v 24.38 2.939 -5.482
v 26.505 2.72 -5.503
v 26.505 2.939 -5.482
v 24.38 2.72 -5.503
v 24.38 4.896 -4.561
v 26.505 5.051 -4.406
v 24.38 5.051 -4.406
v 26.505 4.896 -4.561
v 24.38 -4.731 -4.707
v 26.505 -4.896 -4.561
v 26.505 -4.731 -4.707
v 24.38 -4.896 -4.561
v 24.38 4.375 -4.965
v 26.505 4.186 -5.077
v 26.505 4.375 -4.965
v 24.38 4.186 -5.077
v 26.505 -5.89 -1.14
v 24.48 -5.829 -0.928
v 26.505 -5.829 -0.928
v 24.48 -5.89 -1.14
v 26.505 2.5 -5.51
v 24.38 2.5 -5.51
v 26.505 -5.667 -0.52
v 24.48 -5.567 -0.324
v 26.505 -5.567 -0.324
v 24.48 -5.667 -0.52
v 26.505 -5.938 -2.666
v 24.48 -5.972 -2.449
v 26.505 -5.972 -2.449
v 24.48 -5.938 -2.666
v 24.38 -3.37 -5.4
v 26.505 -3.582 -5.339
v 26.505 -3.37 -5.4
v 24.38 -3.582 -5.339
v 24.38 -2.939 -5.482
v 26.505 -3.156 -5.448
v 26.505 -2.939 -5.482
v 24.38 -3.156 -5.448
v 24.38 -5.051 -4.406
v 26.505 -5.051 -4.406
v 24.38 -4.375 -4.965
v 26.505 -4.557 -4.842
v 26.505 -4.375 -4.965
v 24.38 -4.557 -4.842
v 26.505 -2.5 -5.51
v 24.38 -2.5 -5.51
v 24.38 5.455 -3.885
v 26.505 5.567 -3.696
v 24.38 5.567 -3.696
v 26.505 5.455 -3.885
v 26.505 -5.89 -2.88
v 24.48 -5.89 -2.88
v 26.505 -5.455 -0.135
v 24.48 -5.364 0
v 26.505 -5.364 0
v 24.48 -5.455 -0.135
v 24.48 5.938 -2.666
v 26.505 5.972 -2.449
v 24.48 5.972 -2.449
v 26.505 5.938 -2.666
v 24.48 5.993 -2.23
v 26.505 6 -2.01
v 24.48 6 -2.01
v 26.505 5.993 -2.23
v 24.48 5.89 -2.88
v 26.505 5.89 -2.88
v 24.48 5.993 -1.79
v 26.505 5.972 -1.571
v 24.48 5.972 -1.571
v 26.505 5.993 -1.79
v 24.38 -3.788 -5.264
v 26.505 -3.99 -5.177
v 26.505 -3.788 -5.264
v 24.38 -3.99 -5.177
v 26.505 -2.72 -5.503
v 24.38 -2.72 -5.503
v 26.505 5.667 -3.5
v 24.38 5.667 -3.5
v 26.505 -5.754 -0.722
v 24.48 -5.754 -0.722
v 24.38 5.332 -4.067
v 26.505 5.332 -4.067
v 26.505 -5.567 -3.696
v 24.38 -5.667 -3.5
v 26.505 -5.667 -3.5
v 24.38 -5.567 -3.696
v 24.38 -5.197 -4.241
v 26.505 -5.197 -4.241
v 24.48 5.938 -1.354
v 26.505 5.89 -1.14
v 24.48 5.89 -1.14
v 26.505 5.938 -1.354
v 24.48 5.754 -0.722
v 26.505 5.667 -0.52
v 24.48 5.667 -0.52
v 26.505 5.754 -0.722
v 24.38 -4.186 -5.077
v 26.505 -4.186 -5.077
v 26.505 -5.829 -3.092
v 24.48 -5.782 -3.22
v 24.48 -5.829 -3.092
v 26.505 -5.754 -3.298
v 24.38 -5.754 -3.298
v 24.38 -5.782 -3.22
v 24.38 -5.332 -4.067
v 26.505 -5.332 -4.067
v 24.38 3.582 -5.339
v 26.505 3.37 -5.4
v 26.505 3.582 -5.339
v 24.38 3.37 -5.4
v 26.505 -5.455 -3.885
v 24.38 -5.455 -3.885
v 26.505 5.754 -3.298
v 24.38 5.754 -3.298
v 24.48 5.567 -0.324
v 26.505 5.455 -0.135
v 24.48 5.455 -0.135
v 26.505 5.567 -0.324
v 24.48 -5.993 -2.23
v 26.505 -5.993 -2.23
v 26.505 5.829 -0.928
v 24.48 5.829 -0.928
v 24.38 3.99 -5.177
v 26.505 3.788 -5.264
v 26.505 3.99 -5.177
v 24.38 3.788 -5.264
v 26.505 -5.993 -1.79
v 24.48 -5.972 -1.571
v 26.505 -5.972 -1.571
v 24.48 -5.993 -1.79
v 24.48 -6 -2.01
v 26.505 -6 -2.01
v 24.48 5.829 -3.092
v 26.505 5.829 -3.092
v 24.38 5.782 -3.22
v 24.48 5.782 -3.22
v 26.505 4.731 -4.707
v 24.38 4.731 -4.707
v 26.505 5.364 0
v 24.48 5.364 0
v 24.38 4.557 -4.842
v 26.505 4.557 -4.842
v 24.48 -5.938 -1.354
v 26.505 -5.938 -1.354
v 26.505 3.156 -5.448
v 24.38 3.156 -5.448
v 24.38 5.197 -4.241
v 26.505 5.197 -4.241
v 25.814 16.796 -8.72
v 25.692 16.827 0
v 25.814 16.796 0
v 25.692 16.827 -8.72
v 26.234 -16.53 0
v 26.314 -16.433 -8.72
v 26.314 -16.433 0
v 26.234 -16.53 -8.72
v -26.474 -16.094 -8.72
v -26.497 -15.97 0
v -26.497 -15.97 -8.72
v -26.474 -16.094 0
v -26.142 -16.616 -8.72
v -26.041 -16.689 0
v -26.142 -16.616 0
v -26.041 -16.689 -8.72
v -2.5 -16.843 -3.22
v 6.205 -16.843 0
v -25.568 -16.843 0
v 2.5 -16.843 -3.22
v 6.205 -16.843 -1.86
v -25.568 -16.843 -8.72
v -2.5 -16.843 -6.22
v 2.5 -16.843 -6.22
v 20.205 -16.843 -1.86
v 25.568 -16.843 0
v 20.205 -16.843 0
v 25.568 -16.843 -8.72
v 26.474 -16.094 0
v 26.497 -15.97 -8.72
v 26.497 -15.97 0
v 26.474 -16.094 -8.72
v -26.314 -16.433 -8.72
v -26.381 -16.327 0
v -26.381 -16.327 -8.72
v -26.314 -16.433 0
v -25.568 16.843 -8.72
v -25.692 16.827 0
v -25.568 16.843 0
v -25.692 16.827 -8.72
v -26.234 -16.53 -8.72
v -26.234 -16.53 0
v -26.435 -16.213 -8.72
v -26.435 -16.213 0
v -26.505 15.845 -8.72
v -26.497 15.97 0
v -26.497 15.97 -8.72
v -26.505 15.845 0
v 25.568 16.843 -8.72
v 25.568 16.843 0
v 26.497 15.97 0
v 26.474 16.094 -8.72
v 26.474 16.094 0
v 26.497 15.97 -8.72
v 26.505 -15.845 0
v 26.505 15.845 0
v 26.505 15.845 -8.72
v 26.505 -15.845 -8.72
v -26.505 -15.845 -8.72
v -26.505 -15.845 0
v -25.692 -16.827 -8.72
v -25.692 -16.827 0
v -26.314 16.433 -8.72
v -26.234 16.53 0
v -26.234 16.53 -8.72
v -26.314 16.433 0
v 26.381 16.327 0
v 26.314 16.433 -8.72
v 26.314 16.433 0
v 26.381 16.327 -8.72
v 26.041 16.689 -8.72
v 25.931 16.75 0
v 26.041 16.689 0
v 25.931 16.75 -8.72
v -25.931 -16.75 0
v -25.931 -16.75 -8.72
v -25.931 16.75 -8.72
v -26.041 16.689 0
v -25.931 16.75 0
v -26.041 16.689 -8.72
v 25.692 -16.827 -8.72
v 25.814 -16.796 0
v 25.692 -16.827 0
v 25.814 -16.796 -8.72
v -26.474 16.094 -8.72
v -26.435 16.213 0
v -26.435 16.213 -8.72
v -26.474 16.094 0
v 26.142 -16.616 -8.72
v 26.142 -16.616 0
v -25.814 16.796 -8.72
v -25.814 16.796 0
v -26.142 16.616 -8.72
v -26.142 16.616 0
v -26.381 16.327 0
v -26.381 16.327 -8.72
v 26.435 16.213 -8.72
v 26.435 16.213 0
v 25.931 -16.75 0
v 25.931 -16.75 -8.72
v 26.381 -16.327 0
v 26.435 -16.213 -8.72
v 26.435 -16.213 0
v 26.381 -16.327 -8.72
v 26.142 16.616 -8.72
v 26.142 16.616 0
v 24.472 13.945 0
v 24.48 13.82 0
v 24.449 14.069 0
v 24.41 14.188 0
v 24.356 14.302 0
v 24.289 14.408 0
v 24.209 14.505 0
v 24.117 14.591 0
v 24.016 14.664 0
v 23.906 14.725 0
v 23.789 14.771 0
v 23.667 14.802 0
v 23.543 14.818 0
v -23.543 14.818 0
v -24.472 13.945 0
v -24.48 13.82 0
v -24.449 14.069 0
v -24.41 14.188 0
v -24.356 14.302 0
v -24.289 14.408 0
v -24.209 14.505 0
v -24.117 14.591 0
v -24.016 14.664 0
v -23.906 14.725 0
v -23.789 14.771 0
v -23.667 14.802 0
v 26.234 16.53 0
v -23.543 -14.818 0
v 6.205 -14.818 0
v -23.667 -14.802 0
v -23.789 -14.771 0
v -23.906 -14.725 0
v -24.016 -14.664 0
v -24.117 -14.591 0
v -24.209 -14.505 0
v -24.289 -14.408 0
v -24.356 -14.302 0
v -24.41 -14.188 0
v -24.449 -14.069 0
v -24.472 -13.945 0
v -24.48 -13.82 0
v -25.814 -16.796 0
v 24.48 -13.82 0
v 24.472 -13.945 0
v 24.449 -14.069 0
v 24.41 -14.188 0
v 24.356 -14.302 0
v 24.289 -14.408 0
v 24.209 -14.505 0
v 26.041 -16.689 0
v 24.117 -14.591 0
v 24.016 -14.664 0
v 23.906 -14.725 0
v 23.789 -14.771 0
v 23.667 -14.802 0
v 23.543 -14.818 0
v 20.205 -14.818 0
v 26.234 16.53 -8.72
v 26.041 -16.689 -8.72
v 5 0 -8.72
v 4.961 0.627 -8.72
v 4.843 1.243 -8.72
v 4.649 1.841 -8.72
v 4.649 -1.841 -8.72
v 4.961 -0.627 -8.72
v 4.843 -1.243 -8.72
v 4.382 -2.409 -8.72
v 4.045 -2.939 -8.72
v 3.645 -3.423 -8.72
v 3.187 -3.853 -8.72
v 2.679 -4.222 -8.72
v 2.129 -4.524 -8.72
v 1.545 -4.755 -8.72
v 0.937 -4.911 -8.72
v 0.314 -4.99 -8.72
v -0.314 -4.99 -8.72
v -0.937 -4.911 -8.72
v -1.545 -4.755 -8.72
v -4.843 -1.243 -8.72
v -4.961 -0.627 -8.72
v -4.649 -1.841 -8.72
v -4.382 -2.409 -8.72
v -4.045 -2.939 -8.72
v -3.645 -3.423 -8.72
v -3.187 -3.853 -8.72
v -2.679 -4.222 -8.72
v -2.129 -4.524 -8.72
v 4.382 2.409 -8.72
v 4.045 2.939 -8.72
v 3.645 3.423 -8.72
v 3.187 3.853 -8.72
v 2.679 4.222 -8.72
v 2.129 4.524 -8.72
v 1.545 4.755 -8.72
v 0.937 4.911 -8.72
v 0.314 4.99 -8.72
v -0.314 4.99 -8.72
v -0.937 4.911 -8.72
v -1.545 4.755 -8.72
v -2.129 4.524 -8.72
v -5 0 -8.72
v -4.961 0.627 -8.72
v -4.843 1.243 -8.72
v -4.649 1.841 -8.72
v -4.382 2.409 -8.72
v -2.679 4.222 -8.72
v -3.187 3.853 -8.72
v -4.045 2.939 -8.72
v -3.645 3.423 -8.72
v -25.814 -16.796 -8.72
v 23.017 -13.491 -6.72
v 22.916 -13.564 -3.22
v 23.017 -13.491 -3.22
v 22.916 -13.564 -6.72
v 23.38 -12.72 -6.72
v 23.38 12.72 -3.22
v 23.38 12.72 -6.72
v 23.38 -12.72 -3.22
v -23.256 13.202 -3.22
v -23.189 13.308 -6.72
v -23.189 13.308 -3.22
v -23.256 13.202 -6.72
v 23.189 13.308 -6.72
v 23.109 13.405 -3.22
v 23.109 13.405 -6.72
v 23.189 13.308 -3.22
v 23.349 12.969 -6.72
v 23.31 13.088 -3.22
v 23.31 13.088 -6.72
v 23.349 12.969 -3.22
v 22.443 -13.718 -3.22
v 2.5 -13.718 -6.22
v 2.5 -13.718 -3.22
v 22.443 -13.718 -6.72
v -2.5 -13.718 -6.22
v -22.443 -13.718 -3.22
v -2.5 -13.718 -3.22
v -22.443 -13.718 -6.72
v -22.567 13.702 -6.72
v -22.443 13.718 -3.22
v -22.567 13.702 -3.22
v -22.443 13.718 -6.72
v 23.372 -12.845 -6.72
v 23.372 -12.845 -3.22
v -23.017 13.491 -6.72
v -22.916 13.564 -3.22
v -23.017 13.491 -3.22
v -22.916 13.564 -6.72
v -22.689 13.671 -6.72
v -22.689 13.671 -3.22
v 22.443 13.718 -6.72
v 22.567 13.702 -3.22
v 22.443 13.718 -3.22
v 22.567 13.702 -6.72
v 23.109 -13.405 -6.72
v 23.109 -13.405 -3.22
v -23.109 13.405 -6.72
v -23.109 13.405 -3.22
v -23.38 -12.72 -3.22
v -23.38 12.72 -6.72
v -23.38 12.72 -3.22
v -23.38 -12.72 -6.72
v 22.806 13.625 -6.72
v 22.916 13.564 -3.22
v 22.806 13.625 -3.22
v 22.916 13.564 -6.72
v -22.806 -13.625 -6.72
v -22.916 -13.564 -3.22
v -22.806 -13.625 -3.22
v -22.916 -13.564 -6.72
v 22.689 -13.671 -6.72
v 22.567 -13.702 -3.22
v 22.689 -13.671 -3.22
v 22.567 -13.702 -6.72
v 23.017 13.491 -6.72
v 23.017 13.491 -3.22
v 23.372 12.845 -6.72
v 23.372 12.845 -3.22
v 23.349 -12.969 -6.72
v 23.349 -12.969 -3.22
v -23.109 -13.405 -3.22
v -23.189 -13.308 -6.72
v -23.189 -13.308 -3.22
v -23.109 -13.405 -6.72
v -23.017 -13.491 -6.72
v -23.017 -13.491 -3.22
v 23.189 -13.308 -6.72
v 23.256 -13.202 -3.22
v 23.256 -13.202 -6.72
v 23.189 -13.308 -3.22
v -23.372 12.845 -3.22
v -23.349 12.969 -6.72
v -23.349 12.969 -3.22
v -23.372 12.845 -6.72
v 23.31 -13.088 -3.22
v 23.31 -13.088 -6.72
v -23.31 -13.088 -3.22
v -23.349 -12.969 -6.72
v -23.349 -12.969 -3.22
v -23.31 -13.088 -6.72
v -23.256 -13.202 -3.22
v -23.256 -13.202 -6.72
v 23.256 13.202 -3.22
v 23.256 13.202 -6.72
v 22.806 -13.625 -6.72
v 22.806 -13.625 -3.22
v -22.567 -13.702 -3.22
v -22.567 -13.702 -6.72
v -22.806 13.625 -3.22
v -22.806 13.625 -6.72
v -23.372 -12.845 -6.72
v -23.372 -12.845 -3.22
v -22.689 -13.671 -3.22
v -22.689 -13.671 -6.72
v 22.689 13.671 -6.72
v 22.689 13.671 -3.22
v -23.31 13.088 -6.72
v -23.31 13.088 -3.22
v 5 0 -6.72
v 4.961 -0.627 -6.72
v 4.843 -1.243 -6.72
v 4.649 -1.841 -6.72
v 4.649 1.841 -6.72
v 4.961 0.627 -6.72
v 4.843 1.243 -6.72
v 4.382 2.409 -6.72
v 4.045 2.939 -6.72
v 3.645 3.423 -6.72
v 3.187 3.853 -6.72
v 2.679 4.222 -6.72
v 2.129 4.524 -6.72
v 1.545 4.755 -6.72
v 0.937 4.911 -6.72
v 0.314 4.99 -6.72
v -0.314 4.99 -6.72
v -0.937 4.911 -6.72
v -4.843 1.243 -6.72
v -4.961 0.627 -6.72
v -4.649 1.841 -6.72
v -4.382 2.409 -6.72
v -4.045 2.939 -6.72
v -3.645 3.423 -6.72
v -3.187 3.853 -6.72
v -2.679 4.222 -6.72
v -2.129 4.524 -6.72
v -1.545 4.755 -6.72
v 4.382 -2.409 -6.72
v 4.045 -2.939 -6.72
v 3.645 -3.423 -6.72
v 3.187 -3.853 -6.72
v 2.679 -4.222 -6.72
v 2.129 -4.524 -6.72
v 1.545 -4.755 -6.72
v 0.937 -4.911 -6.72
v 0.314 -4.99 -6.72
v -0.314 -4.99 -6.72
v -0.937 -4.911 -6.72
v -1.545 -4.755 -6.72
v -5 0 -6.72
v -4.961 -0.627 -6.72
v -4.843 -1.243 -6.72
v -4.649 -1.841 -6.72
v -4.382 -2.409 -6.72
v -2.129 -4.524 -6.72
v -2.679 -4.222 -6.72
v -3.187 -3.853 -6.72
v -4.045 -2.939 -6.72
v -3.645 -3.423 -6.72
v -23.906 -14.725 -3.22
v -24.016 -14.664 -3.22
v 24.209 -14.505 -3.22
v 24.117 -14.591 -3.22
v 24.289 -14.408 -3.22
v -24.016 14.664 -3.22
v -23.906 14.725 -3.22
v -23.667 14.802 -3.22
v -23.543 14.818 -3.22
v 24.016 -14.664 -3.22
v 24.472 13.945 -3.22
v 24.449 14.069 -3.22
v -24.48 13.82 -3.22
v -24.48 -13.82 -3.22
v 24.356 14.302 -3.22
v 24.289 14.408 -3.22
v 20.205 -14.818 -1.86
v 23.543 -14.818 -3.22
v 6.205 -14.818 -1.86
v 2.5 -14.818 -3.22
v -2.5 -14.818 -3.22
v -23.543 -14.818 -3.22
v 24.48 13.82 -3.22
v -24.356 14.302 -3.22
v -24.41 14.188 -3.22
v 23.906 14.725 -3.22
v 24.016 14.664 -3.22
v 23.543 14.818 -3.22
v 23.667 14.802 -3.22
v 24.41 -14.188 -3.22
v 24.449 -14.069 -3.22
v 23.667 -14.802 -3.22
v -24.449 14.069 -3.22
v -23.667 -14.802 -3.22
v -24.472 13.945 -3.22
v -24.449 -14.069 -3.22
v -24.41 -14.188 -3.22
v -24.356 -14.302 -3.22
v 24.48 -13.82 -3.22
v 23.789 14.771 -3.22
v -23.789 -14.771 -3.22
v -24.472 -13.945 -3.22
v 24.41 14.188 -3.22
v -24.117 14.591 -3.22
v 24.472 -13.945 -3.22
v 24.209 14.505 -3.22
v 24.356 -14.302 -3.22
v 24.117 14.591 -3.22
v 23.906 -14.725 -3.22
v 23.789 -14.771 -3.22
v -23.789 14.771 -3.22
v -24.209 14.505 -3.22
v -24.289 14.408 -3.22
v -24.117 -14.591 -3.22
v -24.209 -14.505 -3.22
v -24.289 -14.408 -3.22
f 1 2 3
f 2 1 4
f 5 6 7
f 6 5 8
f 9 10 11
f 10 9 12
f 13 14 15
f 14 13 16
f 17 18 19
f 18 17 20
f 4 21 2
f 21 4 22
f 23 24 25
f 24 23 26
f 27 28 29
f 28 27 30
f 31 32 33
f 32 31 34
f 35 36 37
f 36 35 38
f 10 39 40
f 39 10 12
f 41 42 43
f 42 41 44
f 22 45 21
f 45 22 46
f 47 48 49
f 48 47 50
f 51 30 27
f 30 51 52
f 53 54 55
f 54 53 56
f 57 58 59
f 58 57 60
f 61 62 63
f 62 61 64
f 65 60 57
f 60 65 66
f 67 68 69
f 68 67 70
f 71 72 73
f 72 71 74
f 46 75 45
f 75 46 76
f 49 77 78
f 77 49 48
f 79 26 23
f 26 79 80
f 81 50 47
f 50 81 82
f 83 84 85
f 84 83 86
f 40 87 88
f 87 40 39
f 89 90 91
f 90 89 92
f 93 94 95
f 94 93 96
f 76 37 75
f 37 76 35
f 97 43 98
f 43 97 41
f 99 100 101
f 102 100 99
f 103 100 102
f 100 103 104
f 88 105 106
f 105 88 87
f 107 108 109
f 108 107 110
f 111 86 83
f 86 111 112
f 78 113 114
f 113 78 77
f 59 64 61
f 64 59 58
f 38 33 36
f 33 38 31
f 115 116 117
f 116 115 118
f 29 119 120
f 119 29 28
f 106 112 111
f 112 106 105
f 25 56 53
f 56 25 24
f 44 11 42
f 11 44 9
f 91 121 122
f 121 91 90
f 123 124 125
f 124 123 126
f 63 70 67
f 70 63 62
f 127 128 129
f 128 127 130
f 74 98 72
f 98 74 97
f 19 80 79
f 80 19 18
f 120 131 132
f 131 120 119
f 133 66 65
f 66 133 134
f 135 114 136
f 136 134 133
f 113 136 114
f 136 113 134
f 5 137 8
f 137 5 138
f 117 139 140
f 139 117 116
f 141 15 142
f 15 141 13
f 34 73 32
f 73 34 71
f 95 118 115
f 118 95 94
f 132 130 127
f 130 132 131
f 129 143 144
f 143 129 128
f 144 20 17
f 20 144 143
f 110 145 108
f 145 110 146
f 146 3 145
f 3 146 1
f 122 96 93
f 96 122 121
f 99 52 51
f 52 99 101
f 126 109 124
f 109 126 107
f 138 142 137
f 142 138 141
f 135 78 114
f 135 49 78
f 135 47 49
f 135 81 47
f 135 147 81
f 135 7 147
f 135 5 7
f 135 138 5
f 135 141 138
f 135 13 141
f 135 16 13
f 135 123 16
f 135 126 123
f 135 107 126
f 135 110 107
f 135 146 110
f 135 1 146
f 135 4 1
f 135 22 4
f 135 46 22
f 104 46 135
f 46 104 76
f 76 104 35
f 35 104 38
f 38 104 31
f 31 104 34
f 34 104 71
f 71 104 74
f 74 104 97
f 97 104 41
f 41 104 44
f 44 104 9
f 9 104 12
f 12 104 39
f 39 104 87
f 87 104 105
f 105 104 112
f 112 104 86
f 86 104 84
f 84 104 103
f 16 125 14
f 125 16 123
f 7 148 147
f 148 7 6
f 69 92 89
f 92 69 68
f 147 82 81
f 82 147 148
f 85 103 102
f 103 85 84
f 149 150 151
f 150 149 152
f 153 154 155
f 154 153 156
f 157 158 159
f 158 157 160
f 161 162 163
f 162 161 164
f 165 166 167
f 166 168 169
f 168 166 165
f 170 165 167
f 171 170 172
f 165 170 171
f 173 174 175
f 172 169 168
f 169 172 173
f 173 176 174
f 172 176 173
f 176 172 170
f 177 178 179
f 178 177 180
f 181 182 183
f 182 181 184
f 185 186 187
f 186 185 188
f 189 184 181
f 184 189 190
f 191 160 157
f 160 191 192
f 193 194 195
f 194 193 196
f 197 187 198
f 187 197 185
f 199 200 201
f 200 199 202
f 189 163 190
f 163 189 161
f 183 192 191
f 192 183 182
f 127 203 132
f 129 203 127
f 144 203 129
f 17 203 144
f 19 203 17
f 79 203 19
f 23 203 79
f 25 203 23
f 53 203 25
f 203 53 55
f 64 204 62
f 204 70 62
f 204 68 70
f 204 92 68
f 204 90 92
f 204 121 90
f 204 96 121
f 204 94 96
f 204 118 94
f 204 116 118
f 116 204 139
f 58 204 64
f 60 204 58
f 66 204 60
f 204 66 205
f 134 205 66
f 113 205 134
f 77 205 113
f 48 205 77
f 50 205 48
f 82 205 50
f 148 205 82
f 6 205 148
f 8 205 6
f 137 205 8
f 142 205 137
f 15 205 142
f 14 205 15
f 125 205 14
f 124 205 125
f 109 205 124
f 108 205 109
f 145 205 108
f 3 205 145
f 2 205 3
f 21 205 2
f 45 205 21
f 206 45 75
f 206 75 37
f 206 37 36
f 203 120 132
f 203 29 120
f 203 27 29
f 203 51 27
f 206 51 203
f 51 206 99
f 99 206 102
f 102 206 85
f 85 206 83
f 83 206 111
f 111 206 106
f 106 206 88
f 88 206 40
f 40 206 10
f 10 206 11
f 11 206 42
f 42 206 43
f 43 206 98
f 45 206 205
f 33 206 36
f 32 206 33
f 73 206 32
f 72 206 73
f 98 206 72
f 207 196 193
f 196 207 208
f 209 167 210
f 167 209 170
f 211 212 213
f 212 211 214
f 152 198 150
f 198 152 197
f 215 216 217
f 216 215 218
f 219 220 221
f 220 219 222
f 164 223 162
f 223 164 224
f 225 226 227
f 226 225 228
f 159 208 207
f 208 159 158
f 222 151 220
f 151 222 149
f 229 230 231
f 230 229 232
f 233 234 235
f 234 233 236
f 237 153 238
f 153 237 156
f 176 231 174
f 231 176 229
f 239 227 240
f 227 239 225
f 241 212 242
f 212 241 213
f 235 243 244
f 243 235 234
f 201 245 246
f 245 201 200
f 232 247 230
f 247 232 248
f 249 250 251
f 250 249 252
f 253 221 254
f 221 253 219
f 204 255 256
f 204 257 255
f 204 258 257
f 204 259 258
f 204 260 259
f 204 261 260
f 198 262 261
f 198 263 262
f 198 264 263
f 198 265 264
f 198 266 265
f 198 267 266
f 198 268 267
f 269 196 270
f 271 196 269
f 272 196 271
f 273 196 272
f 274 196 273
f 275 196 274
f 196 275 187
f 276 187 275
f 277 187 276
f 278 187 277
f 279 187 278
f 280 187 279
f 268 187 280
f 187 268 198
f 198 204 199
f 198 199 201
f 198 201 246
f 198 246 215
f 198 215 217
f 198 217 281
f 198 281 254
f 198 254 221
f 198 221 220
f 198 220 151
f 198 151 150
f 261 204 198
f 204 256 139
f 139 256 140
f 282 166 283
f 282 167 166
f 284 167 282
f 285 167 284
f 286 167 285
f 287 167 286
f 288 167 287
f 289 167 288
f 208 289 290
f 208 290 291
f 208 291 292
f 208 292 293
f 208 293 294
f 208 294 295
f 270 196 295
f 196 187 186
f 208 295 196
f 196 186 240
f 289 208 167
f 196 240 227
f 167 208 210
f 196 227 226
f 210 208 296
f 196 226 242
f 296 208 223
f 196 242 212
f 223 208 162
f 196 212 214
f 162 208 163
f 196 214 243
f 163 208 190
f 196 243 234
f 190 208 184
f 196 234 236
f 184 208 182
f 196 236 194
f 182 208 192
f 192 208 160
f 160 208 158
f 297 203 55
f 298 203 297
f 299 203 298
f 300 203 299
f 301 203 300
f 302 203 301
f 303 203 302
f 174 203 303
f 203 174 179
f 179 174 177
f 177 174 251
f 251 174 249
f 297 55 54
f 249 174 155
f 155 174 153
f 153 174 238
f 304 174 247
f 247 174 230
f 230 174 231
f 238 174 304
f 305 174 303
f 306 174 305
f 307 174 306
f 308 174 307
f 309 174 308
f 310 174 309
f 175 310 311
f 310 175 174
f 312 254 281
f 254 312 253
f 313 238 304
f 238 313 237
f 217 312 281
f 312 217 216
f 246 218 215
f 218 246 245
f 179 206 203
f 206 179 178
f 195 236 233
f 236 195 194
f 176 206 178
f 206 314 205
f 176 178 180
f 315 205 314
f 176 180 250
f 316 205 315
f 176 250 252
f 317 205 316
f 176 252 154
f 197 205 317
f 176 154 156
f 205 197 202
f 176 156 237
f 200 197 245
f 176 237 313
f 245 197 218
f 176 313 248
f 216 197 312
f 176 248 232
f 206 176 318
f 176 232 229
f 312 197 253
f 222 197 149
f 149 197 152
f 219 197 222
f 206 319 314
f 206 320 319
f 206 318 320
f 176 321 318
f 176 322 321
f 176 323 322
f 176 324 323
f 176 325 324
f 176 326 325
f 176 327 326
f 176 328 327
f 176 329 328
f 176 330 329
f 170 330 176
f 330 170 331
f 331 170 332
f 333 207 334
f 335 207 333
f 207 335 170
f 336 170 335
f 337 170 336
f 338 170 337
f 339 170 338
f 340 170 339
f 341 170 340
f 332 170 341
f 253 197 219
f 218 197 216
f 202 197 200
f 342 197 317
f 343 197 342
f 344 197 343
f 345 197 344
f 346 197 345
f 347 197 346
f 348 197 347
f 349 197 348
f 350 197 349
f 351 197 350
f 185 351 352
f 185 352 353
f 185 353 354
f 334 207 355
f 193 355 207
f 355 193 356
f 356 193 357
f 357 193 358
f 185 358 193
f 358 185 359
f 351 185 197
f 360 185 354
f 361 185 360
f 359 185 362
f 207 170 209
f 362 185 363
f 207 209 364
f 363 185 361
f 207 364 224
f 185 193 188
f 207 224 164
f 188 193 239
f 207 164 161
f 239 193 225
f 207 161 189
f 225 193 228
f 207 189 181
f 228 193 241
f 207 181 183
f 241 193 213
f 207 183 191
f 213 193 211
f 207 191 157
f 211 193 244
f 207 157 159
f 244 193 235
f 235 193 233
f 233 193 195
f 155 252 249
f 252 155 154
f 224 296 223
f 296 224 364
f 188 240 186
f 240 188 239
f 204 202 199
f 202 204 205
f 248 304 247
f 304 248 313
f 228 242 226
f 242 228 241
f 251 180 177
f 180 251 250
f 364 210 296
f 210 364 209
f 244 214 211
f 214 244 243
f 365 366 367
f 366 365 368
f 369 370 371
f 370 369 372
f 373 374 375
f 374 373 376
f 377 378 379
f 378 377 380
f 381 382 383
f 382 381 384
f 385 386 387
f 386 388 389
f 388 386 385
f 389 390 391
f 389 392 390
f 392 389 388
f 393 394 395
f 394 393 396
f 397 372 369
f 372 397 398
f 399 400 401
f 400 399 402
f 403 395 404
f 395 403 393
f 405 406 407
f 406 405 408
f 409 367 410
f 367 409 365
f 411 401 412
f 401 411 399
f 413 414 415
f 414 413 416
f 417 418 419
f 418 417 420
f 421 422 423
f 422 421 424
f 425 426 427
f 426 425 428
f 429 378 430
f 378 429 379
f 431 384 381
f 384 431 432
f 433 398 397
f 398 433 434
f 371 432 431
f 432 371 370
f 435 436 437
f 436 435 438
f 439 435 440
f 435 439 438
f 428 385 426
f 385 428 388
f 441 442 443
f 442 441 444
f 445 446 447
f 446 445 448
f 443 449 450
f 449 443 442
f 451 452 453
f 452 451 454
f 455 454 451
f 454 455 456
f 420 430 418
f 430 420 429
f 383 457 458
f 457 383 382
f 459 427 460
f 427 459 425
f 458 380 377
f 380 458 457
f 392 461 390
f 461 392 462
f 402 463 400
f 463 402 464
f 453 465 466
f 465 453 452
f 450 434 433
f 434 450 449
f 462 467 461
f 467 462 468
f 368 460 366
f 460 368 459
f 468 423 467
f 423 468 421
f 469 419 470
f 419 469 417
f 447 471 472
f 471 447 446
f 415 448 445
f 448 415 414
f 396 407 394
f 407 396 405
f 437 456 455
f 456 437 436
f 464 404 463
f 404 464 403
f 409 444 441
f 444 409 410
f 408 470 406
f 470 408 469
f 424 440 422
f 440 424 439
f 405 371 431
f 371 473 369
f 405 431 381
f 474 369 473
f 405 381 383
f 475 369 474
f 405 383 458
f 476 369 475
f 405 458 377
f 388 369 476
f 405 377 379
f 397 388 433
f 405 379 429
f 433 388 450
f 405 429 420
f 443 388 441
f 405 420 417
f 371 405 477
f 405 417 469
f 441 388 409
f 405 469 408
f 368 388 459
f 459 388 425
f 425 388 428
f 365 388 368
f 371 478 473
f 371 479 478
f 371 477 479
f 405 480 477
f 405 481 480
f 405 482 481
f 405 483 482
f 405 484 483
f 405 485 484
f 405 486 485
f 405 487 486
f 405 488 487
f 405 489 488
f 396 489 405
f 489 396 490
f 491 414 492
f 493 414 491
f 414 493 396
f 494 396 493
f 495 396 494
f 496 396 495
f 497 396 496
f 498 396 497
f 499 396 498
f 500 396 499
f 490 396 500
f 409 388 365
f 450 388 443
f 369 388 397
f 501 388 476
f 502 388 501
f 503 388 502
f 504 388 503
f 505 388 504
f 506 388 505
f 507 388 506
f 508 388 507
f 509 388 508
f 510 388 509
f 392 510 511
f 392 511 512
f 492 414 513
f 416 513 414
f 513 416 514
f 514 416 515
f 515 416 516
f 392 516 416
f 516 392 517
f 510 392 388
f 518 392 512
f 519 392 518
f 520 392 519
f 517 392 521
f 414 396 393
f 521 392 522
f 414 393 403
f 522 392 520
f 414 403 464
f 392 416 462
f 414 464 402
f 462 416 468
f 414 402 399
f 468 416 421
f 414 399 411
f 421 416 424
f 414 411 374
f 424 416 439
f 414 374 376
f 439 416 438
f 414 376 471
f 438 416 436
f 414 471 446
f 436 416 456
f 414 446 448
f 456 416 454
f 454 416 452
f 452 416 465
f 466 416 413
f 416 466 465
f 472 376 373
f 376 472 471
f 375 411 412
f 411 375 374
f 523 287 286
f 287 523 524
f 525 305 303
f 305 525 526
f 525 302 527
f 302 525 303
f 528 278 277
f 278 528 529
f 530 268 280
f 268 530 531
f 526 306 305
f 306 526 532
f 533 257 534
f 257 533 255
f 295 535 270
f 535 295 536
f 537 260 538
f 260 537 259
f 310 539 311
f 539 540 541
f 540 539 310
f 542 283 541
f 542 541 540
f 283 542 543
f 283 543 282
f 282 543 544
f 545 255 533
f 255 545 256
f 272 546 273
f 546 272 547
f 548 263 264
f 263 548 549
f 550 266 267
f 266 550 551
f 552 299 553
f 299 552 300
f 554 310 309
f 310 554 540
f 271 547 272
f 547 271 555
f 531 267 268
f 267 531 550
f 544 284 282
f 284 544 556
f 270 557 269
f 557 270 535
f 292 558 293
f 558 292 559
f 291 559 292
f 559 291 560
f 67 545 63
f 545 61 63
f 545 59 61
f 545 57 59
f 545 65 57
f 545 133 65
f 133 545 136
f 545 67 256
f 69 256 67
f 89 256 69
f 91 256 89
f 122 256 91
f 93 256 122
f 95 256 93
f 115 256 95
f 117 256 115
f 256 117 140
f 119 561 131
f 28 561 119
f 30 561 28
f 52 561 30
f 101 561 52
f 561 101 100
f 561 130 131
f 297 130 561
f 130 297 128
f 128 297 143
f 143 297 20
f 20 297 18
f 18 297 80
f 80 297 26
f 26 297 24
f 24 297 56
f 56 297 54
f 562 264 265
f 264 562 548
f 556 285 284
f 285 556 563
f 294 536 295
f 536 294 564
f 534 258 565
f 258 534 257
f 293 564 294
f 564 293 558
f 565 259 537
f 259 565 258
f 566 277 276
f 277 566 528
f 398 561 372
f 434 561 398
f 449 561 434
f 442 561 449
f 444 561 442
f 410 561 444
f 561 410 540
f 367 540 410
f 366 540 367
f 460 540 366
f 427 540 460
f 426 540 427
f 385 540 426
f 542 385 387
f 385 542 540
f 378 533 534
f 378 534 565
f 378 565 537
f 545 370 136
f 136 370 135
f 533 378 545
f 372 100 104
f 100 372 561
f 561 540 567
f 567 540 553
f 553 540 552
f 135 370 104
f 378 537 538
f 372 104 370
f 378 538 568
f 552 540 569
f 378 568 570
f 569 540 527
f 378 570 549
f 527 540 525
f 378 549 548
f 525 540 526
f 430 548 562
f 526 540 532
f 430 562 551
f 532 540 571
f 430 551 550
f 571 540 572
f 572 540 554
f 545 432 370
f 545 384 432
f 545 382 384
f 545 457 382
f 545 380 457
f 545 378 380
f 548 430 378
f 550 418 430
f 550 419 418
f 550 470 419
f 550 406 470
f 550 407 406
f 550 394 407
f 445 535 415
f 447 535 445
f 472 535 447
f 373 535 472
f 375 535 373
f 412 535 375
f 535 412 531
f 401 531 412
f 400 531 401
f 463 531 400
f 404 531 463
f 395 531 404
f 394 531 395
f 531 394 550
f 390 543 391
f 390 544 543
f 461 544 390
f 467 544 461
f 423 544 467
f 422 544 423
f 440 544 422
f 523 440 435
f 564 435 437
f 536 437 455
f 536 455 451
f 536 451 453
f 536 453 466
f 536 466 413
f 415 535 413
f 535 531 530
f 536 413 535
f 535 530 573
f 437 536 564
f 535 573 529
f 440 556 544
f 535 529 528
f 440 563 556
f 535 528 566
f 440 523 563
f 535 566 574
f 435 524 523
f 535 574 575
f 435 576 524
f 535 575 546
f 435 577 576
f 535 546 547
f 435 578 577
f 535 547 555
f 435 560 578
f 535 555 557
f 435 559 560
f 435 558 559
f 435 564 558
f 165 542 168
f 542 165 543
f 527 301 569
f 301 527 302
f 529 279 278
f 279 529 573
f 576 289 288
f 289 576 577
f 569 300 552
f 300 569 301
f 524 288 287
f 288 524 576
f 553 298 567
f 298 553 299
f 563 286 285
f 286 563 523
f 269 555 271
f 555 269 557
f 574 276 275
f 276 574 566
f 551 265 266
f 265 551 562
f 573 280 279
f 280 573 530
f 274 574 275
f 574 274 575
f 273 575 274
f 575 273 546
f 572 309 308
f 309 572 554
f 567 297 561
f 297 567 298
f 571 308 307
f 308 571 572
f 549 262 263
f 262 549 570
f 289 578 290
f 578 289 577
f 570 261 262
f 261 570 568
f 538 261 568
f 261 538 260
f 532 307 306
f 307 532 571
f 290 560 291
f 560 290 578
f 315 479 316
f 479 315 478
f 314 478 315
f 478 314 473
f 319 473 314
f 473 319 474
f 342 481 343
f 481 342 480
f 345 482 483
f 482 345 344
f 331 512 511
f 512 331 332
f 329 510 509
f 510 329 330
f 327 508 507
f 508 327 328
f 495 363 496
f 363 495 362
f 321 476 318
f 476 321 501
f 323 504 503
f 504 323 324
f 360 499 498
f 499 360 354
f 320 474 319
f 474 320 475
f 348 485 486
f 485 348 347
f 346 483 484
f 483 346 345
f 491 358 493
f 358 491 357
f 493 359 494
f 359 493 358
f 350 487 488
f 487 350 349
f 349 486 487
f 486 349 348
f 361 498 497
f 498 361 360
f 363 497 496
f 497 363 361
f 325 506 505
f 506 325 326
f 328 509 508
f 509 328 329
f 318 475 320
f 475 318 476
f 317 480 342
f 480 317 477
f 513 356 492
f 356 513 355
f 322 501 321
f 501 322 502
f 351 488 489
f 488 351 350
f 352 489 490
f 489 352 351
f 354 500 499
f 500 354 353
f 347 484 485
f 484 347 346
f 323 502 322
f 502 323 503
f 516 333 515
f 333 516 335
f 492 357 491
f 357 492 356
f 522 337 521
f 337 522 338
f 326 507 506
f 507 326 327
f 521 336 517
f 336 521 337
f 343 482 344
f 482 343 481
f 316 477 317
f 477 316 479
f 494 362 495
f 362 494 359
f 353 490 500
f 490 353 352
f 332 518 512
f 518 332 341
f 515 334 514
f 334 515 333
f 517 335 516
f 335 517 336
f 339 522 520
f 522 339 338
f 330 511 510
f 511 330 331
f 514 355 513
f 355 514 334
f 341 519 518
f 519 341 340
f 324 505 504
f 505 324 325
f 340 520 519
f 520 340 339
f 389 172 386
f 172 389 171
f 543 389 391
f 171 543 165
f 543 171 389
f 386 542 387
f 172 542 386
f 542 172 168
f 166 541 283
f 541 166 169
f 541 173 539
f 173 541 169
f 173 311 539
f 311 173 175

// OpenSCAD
// file: usbA-C.scad
/* [Hidden] */

TWEAK = 1;

module make_USBA(location = "UNKNOWN")
{
     // true measurements of usb.
     PUNCH_DIA = 6 + TWEAK;
     PUNCH_WIDTH = 11.0 + TWEAK;
     PUNCH_DIST = PUNCH_WIDTH - PUNCH_DIA;
     PUNCH_LENGTH = 17.0;

     // this is the hole punch size
     USB_DIA = 1.92 + TWEAK/2;
     USB_WIDTH = 7.0 + TWEAK/2;
     USB_DIST = PUNCH_WIDTH - PUNCH_DIA;
     USB_LENGTH = 5.68;
    

    mUSB_DIA = (location == "ABOVE") ? +USB_DIA/2 : location == "BELOW" ? -USB_DIA/2: 0;
    
    translate([ 0, mUSB_DIA, 0])  
    {
         if ($preview)
         {
             color("PINK")
             translate( [-PUNCH_WIDTH , -mUSB_DIA, 0])  // one face to sit 'on the board'
             rotate([90, 90, 0])
             cube( [PUNCH_WIDTH * 2, PUNCH_WIDTH * 2, 0.1], center = false);    // targeting plane
         }
         
         //translate( [0, USB_DIA/2, 0])  // one face to sit 'on the board'
         {
             color("YELLOW", .3)
             hull()
             {
                 translate([ PUNCH_DIST /2, 0, 0 ])
                 cylinder(h = PUNCH_LENGTH, d = PUNCH_DIA, $fn=100);
                 
                 translate([ -PUNCH_DIST /2, 0, 0 ])
                 cylinder(h = PUNCH_LENGTH, d = PUNCH_DIA, $fn=100);
             }
             
             rotate([180, 0, 0])
             #hull()
             {
                 translate([ USB_DIST /2, 0, 0 ])
                 cylinder(h = USB_LENGTH, d = USB_DIA, $fn=100);
                 
                 translate([ -USB_DIST /2, 0, 0 ])
                 cylinder(h = USB_LENGTH, d = USB_DIA, $fn=100);
             }
         }
     }
}

module make_USBC( location = "UNKNOWN")
{
     PUNCH_DIA = 6.10 + TWEAK;
     PUNCH_WIDTH = 10.9 + TWEAK;
     PUNCH_DIST = PUNCH_WIDTH - PUNCH_DIA;
     PUNCH_LENGTH = 14.0;

    // true usb metal dimensions.
     USB_DIA = 2.54 + TWEAK/2;
     USB_WIDTH = 8.25 + TWEAK/2;
     USB_DIST = PUNCH_WIDTH - PUNCH_DIA;
     USB_LENGTH = 7.47;

    mUSB_DIA = (location == "ABOVE") ? +USB_DIA/2 : location == "BELOW" ? -USB_DIA/2: 0;
    
    translate([ 0, mUSB_DIA, 0])  
    {
         if ($preview)
         {
             color("GREY")
             translate( [-PUNCH_WIDTH , -mUSB_DIA, 0])  // one face to sit 'on the board'
             rotate([90, 90, 0])
             cube( [PUNCH_WIDTH * 2, PUNCH_WIDTH * 2, 0.1], center = false);    // targeting plane
         }
         
         //translate( [0, USB_DIA/2, 0])  // one face to sit 'on the board'
         {
             color("ORANGE", .3)
             hull()
             {
                 translate([ PUNCH_DIST /2, 0, 0 ])
                 cylinder(h = PUNCH_LENGTH, d = PUNCH_DIA, $fn=100);
                 
                 translate([ -PUNCH_DIST /2, 0, 0 ])
                 cylinder(h = PUNCH_LENGTH, d = PUNCH_DIA, $fn=100);
             }
             
             rotate([180, 0, 0])
             #hull()
             {
                 translate([ USB_DIST /2, 0, 0 ])
                 cylinder(h = USB_LENGTH, d = USB_DIA, $fn=100);
                 
                 translate([ -USB_DIST /2, 0, 0 ])
                 cylinder(h = USB_LENGTH, d = USB_DIA, $fn=100);
             }
         }
     }

}
translate([20, 0, 0])
make_USBA("ABOVE");
translate([40,0, 0])
make_USBA("CENTER");
translate([60, 0, 0])
make_USBA("BELOW");
/*
translate([ 0, 10, 0])
{
    translate([20, 0, 0])
    make_USBC("ABOVE");
    translate([40,0, 0])
    make_USBC("CENTER");
    translate([60, 0, 0])
    make_USBC("BELOW");
}
*/
//make_USBC("CENTER");
// main file
use <usbA-C.scad>

FUDGE=.25;
wall_thickness = 2;     // total thickness of any wall

/*
    BOARD="CHARGER";
    charger_board = [99.33, 29.33, 1.58];
    charger_bolt_inside = [ 91.93, 22.01 ];
    charger_bolt_outside= [ 97.63, 27.75 ];
    board = charger_board;
    bolt_inside = charger_bolt_inside;
    bolt_outside= charger_bolt_outside;
    bolt_drill_diameter = 2.5 ; //for M3 appropriate drill for bolt dia

    underside_tallest_component = 6;
    
    mini_trans=[ board.x/2 - 9.55 , board.y/2 - wall_thickness*2 , -board.z];
    mini_rotor=[ -90, 180, 0];

    c_trans = [ board.x/2 - 23.86, -board.y/2 + wall_thickness*2 , -board.z];
    c_rotor = [ 90, 0, 0]);

*/

/*
    BOARD="TTGO";
    ttgo_board = [100, 32.80, 1.58];
    ttgo_bolt_inside = [ 93.40, 26.09 ];
    ttgo_bolt_outside= [ 97.10, 29.66 ];
    board = ttgo_board;
    bolt_inside = ttgo_bolt_inside;
    bolt_outside= ttgo_bolt_outside;
    underside_tallest_component = 21;
    bolt_drill_diameter = 1.6; //M2 appropriate drill for bolt dia
    go_usb = false;
*/


    BOARD="DRIVER";  // waveshare driver board
    driver_board = [48.76, 29.44, 1.61 * 2];
    driver_bolt_inside = [ 0, 0 ];
    driver_bolt_outside= [ 0, 0 ];
    board = driver_board;
    bolt_inside = driver_bolt_inside;
    bolt_outside= driver_bolt_outside;
    underside_tallest_component = 2.50;
    bolt_drill_diameter = 0; //M2 appropriate drill for bolt dia
    go_usb = false;

    mini_trans=[ board.x/2, 0, -board.z];
    mini_rotor=[ -90, 0, -90];

    c_trans = [ 0,0,0];
    c_rotor = [ 90, 0, 0];

/*
    BOARD="WROVER_DEV";
    charger_board = [87.10, 75.26, 1.67];
    charger_bolt_inside = [ 78.23, 66.10 ];
    charger_bolt_outside= [ 83.73, 71.74 ];
    board = charger_board;
    bolt_inside = charger_bolt_inside;
    bolt_outside= charger_bolt_outside;
    bolt_drill_diameter = 2.5 ; //for M3 appropriate drill for bolt dia
    underside_tallest_component = 3;
    go_usb = false;
*/
cross_section = false;

//-------------------------------------------------------------
//-------------------------------------------------------------

/* [Hidden] */

bolt_diameter_x = (bolt_outside.x - bolt_inside.x)/2; 
bolt_diameter_y = (bolt_outside.y - bolt_inside.y)/2;

//above 2 should be identical, but average them out 
bolt_diameter = (bolt_diameter_x + bolt_diameter_y)/2;

echo ("bolt diameter x = ",bolt_diameter);
echo ("bolt drill diameter x = ",bolt_drill_diameter);

post_diameter = bolt_diameter * 1.25;  // internal post for screws



bolt_center_x  = (bolt_inside.x + bolt_outside.x)/2;   //x dimension                                                     
bolt_center_y  = (bolt_inside.y + bolt_outside.y)/2;   //y dimension

//outside dimensions of the box
box_outside_x = board.x+ wall_thickness * 2  + FUDGE;   //x dimension
box_outside_y = board.y + wall_thickness * 2  + FUDGE;    //y dimension
box_outside_z = max(wall_thickness * 2, underside_tallest_component + wall_thickness + board.z + 1);   //z dimension

$fn=50;

//additional parameters
lid_thickness= 2;       // comment out if no lid required
lid_lip = 2;            // 0 makes lid flush to top
lid_tolerance = .5;     // shrink lid so not squeaky fit

fn=50;

//-------------------------------------------------------------------------

module miniUSB(trans, rotor)
{
    if (trans != [ 0,0,0])
    {
        translate(trans)
        rotate(rotor)
        make_USBA(location = "BELOW");
    }
}

//-------------------------------------------------------------------------

module USB_C(trans, rotor){    
    if (trans != [ 0,0,0])
    {
        translate(trans)
        rotate(rotor)
        make_USBC(location = "BELOW");
    }
}

//-------------------------------------------------------------------------
// make 4 cylinders EXACTLY on all 4 xy permutations
module quad_cylinders(x,y,z,h,r)
{
    translate([x,y,z]){         // move post to this location
        cylinder(r = r, h = h); // make one post
    }
    translate([-x,y,z]){        // move post to this location
        cylinder(r = r, h = h); // make one post
    }   
    translate([-x,-y,z]){       // move post to this location
        cylinder(r = r, h = h); // make one post
    }
    translate([x,-y,z]){        // move post to this location
        cylinder(r = r, h = h); // make one post
    }    
}
//-------------------------------------------------------------------------
module add_screws()
{
    if(bolt_center_x) // no bolt spec, no posts then.
    {
        // add screw in posts and drill out the center for screws
        color("CYAN")
         difference () {
            quad_cylinders( 
                x= bolt_center_x/2,
                y= bolt_center_y/2,
                z= -(box_outside_z- wall_thickness + board.z),
                h= box_outside_z- wall_thickness,
                r = post_diameter  // no div/2 beef up bolt support
            );
        
             // ADD the holes for the screws.
            quad_cylinders( 
                x= bolt_center_x/2,
                y= bolt_center_y/2,
                z= -(box_outside_z- wall_thickness + board.z),
                h= box_outside_z- wall_thickness,
                r = bolt_drill_diameter/2
            );
        }
    }
} 

//-------------------------------------------------------------------------

// make 4 cylinders to set boundaries for a hull
// all cylinders must be COMPLETELY INSIDE the x,y specs

module prep_roundbox(x,y,z,h,r)
{
    translate([x-r,y-r,z]){         // move post to this location
        cylinder(r = r, h = h); // make one post
    }
    translate([-x+r,y-r,z]){        // move post to this location
        cylinder(r = r, h = h); // make one post
    }   
    translate([-x+r,-y+r,z]){       // move post to this location
        cylinder(r = r, h = h); // make one post
    }
    translate([x-r,-y+r,z]){        // move post to this location
        cylinder(r = r, h = h); // make one post
    }    
}
//-------------------------------------------------------------------------
difference()
{
    // build the box
    union()
    {
        difference() {
           // make 2 boxes one inside the other and remove "inside box" from "outside box"
            // use prep_roundbox to define OUTSIDE of a solid box centered on 0,0
            hull(){
                prep_roundbox(  
                    x=(box_outside_x/2),
                    y=(box_outside_y/2),
                    z= -box_outside_z,
                    h= box_outside_z,
                    r = wall_thickness/2);
            }

            
            // as board will not be below the prep_roundbox and
            // the prep_roundbox aren't too beefy
            // Hollow out a 1mm ledge that the BOTTOM 
            //       of the board can sit on. 
            //aka 1mm support perimeter

            r2 = bolt_diameter ? (board.x- (bolt_inside.x + bolt_diameter))/2  : 1;
            
            #hull(){
                prep_roundbox(
                    x=(board.x/2 - 1 ),
                    y=(board.y/2 - 1),
                    z= -(box_outside_z- wall_thickness), 
                    h= box_outside_z, // -board.z ,
                    r = r2 );
            }
            
            // the board will sit on a ledge. Cut out a board on the
            // TOP face of the box that the board will sit IN.
            
            hull(){
                prep_roundbox(
                    x=(board.x/2 +.1 ),
                    y=(board.y/2 + .1),
                    z= -board.z, 
                    h= board.z + .2,
                    r = 1); //dont bother figuring out board radius.
            }

        
            miniUSB( trans= mini_trans,
                     rotor= mini_rotor);

            USB_C( trans= c_trans,
                   rotor= c_rotor);
        }
        add_screws();
    }  // box is complete
    
    translate([0, 0, -box_outside_z])
    #cylinder(h = box_outside_z, d = 10);

    translate([0, -box_outside_y/2 + wall_thickness, -box_outside_z+wall_thickness*2])
    rotate([180, 0, 0])
    #cube ([5,wall_thickness+12, 3], true);

    // WAVESHARE RIBBON ------------------------
    RIBBON = [ 16, 10, 2];
    translate([box_outside_x/2 - RIBBON.x/2 - 5.3 , -box_outside_y/2 +wall_thickness, -box_outside_z/2+wall_thickness*2])
    rotate([0, 0, 90])
    #cube ([5,wall_thickness+12, 3], true);
    // -----------------------------------------

    
    // make a cross section.
    translate([cross_section? 0:99999, 
               cross_section? 0:9999999,
               -box_outside_z])
    cube ([ box_outside_x/2, box_outside_y/2, box_outside_z + 3]);
}


/*    miniUSB( trans=[ board.x/2 - 9.55 , board.y/2 - wall_thickness*2 , -board.z],
             rotor [ -90, 180, 0]);
    
    USB-C( trans=[ board.x/2 - 23.86, -board.y/2 + wall_thickness*2 , -board.z],
            rotor= [ 90, 0, 0])
             


// create a lid

translate([10 + box_outside_x, 0, 0]) 
difference()
{
    hull()
    {
            // make undrilled lid
            prep_roundbox(
                x=(box_outside_x/2  - post_diameter - wall_thickness/2 - lid_tolerance),
                y=(box_outside_y/2 - post_diameter - wall_thickness/2 - lid_tolerance),
                z= 0, // move up to create bottom
                h= lid_thickness,
                r = post_diameter);
            
            // drill outholes for the screws via difference
            // ADD the holes for the screws.
    }
    
    color("red")
    // drill the holes in the lid
    prep_roundbox( 
    x=(box_outside_x/2  - wall_thickness/2 - post_diameter/2),
    y=(box_outside_y/2 - wall_thickness/2 - post_diameter/2),
    z= 0,
    h= lid_thickness,
    r = bolt_drill_diameter/2 +.5);

}
*/
